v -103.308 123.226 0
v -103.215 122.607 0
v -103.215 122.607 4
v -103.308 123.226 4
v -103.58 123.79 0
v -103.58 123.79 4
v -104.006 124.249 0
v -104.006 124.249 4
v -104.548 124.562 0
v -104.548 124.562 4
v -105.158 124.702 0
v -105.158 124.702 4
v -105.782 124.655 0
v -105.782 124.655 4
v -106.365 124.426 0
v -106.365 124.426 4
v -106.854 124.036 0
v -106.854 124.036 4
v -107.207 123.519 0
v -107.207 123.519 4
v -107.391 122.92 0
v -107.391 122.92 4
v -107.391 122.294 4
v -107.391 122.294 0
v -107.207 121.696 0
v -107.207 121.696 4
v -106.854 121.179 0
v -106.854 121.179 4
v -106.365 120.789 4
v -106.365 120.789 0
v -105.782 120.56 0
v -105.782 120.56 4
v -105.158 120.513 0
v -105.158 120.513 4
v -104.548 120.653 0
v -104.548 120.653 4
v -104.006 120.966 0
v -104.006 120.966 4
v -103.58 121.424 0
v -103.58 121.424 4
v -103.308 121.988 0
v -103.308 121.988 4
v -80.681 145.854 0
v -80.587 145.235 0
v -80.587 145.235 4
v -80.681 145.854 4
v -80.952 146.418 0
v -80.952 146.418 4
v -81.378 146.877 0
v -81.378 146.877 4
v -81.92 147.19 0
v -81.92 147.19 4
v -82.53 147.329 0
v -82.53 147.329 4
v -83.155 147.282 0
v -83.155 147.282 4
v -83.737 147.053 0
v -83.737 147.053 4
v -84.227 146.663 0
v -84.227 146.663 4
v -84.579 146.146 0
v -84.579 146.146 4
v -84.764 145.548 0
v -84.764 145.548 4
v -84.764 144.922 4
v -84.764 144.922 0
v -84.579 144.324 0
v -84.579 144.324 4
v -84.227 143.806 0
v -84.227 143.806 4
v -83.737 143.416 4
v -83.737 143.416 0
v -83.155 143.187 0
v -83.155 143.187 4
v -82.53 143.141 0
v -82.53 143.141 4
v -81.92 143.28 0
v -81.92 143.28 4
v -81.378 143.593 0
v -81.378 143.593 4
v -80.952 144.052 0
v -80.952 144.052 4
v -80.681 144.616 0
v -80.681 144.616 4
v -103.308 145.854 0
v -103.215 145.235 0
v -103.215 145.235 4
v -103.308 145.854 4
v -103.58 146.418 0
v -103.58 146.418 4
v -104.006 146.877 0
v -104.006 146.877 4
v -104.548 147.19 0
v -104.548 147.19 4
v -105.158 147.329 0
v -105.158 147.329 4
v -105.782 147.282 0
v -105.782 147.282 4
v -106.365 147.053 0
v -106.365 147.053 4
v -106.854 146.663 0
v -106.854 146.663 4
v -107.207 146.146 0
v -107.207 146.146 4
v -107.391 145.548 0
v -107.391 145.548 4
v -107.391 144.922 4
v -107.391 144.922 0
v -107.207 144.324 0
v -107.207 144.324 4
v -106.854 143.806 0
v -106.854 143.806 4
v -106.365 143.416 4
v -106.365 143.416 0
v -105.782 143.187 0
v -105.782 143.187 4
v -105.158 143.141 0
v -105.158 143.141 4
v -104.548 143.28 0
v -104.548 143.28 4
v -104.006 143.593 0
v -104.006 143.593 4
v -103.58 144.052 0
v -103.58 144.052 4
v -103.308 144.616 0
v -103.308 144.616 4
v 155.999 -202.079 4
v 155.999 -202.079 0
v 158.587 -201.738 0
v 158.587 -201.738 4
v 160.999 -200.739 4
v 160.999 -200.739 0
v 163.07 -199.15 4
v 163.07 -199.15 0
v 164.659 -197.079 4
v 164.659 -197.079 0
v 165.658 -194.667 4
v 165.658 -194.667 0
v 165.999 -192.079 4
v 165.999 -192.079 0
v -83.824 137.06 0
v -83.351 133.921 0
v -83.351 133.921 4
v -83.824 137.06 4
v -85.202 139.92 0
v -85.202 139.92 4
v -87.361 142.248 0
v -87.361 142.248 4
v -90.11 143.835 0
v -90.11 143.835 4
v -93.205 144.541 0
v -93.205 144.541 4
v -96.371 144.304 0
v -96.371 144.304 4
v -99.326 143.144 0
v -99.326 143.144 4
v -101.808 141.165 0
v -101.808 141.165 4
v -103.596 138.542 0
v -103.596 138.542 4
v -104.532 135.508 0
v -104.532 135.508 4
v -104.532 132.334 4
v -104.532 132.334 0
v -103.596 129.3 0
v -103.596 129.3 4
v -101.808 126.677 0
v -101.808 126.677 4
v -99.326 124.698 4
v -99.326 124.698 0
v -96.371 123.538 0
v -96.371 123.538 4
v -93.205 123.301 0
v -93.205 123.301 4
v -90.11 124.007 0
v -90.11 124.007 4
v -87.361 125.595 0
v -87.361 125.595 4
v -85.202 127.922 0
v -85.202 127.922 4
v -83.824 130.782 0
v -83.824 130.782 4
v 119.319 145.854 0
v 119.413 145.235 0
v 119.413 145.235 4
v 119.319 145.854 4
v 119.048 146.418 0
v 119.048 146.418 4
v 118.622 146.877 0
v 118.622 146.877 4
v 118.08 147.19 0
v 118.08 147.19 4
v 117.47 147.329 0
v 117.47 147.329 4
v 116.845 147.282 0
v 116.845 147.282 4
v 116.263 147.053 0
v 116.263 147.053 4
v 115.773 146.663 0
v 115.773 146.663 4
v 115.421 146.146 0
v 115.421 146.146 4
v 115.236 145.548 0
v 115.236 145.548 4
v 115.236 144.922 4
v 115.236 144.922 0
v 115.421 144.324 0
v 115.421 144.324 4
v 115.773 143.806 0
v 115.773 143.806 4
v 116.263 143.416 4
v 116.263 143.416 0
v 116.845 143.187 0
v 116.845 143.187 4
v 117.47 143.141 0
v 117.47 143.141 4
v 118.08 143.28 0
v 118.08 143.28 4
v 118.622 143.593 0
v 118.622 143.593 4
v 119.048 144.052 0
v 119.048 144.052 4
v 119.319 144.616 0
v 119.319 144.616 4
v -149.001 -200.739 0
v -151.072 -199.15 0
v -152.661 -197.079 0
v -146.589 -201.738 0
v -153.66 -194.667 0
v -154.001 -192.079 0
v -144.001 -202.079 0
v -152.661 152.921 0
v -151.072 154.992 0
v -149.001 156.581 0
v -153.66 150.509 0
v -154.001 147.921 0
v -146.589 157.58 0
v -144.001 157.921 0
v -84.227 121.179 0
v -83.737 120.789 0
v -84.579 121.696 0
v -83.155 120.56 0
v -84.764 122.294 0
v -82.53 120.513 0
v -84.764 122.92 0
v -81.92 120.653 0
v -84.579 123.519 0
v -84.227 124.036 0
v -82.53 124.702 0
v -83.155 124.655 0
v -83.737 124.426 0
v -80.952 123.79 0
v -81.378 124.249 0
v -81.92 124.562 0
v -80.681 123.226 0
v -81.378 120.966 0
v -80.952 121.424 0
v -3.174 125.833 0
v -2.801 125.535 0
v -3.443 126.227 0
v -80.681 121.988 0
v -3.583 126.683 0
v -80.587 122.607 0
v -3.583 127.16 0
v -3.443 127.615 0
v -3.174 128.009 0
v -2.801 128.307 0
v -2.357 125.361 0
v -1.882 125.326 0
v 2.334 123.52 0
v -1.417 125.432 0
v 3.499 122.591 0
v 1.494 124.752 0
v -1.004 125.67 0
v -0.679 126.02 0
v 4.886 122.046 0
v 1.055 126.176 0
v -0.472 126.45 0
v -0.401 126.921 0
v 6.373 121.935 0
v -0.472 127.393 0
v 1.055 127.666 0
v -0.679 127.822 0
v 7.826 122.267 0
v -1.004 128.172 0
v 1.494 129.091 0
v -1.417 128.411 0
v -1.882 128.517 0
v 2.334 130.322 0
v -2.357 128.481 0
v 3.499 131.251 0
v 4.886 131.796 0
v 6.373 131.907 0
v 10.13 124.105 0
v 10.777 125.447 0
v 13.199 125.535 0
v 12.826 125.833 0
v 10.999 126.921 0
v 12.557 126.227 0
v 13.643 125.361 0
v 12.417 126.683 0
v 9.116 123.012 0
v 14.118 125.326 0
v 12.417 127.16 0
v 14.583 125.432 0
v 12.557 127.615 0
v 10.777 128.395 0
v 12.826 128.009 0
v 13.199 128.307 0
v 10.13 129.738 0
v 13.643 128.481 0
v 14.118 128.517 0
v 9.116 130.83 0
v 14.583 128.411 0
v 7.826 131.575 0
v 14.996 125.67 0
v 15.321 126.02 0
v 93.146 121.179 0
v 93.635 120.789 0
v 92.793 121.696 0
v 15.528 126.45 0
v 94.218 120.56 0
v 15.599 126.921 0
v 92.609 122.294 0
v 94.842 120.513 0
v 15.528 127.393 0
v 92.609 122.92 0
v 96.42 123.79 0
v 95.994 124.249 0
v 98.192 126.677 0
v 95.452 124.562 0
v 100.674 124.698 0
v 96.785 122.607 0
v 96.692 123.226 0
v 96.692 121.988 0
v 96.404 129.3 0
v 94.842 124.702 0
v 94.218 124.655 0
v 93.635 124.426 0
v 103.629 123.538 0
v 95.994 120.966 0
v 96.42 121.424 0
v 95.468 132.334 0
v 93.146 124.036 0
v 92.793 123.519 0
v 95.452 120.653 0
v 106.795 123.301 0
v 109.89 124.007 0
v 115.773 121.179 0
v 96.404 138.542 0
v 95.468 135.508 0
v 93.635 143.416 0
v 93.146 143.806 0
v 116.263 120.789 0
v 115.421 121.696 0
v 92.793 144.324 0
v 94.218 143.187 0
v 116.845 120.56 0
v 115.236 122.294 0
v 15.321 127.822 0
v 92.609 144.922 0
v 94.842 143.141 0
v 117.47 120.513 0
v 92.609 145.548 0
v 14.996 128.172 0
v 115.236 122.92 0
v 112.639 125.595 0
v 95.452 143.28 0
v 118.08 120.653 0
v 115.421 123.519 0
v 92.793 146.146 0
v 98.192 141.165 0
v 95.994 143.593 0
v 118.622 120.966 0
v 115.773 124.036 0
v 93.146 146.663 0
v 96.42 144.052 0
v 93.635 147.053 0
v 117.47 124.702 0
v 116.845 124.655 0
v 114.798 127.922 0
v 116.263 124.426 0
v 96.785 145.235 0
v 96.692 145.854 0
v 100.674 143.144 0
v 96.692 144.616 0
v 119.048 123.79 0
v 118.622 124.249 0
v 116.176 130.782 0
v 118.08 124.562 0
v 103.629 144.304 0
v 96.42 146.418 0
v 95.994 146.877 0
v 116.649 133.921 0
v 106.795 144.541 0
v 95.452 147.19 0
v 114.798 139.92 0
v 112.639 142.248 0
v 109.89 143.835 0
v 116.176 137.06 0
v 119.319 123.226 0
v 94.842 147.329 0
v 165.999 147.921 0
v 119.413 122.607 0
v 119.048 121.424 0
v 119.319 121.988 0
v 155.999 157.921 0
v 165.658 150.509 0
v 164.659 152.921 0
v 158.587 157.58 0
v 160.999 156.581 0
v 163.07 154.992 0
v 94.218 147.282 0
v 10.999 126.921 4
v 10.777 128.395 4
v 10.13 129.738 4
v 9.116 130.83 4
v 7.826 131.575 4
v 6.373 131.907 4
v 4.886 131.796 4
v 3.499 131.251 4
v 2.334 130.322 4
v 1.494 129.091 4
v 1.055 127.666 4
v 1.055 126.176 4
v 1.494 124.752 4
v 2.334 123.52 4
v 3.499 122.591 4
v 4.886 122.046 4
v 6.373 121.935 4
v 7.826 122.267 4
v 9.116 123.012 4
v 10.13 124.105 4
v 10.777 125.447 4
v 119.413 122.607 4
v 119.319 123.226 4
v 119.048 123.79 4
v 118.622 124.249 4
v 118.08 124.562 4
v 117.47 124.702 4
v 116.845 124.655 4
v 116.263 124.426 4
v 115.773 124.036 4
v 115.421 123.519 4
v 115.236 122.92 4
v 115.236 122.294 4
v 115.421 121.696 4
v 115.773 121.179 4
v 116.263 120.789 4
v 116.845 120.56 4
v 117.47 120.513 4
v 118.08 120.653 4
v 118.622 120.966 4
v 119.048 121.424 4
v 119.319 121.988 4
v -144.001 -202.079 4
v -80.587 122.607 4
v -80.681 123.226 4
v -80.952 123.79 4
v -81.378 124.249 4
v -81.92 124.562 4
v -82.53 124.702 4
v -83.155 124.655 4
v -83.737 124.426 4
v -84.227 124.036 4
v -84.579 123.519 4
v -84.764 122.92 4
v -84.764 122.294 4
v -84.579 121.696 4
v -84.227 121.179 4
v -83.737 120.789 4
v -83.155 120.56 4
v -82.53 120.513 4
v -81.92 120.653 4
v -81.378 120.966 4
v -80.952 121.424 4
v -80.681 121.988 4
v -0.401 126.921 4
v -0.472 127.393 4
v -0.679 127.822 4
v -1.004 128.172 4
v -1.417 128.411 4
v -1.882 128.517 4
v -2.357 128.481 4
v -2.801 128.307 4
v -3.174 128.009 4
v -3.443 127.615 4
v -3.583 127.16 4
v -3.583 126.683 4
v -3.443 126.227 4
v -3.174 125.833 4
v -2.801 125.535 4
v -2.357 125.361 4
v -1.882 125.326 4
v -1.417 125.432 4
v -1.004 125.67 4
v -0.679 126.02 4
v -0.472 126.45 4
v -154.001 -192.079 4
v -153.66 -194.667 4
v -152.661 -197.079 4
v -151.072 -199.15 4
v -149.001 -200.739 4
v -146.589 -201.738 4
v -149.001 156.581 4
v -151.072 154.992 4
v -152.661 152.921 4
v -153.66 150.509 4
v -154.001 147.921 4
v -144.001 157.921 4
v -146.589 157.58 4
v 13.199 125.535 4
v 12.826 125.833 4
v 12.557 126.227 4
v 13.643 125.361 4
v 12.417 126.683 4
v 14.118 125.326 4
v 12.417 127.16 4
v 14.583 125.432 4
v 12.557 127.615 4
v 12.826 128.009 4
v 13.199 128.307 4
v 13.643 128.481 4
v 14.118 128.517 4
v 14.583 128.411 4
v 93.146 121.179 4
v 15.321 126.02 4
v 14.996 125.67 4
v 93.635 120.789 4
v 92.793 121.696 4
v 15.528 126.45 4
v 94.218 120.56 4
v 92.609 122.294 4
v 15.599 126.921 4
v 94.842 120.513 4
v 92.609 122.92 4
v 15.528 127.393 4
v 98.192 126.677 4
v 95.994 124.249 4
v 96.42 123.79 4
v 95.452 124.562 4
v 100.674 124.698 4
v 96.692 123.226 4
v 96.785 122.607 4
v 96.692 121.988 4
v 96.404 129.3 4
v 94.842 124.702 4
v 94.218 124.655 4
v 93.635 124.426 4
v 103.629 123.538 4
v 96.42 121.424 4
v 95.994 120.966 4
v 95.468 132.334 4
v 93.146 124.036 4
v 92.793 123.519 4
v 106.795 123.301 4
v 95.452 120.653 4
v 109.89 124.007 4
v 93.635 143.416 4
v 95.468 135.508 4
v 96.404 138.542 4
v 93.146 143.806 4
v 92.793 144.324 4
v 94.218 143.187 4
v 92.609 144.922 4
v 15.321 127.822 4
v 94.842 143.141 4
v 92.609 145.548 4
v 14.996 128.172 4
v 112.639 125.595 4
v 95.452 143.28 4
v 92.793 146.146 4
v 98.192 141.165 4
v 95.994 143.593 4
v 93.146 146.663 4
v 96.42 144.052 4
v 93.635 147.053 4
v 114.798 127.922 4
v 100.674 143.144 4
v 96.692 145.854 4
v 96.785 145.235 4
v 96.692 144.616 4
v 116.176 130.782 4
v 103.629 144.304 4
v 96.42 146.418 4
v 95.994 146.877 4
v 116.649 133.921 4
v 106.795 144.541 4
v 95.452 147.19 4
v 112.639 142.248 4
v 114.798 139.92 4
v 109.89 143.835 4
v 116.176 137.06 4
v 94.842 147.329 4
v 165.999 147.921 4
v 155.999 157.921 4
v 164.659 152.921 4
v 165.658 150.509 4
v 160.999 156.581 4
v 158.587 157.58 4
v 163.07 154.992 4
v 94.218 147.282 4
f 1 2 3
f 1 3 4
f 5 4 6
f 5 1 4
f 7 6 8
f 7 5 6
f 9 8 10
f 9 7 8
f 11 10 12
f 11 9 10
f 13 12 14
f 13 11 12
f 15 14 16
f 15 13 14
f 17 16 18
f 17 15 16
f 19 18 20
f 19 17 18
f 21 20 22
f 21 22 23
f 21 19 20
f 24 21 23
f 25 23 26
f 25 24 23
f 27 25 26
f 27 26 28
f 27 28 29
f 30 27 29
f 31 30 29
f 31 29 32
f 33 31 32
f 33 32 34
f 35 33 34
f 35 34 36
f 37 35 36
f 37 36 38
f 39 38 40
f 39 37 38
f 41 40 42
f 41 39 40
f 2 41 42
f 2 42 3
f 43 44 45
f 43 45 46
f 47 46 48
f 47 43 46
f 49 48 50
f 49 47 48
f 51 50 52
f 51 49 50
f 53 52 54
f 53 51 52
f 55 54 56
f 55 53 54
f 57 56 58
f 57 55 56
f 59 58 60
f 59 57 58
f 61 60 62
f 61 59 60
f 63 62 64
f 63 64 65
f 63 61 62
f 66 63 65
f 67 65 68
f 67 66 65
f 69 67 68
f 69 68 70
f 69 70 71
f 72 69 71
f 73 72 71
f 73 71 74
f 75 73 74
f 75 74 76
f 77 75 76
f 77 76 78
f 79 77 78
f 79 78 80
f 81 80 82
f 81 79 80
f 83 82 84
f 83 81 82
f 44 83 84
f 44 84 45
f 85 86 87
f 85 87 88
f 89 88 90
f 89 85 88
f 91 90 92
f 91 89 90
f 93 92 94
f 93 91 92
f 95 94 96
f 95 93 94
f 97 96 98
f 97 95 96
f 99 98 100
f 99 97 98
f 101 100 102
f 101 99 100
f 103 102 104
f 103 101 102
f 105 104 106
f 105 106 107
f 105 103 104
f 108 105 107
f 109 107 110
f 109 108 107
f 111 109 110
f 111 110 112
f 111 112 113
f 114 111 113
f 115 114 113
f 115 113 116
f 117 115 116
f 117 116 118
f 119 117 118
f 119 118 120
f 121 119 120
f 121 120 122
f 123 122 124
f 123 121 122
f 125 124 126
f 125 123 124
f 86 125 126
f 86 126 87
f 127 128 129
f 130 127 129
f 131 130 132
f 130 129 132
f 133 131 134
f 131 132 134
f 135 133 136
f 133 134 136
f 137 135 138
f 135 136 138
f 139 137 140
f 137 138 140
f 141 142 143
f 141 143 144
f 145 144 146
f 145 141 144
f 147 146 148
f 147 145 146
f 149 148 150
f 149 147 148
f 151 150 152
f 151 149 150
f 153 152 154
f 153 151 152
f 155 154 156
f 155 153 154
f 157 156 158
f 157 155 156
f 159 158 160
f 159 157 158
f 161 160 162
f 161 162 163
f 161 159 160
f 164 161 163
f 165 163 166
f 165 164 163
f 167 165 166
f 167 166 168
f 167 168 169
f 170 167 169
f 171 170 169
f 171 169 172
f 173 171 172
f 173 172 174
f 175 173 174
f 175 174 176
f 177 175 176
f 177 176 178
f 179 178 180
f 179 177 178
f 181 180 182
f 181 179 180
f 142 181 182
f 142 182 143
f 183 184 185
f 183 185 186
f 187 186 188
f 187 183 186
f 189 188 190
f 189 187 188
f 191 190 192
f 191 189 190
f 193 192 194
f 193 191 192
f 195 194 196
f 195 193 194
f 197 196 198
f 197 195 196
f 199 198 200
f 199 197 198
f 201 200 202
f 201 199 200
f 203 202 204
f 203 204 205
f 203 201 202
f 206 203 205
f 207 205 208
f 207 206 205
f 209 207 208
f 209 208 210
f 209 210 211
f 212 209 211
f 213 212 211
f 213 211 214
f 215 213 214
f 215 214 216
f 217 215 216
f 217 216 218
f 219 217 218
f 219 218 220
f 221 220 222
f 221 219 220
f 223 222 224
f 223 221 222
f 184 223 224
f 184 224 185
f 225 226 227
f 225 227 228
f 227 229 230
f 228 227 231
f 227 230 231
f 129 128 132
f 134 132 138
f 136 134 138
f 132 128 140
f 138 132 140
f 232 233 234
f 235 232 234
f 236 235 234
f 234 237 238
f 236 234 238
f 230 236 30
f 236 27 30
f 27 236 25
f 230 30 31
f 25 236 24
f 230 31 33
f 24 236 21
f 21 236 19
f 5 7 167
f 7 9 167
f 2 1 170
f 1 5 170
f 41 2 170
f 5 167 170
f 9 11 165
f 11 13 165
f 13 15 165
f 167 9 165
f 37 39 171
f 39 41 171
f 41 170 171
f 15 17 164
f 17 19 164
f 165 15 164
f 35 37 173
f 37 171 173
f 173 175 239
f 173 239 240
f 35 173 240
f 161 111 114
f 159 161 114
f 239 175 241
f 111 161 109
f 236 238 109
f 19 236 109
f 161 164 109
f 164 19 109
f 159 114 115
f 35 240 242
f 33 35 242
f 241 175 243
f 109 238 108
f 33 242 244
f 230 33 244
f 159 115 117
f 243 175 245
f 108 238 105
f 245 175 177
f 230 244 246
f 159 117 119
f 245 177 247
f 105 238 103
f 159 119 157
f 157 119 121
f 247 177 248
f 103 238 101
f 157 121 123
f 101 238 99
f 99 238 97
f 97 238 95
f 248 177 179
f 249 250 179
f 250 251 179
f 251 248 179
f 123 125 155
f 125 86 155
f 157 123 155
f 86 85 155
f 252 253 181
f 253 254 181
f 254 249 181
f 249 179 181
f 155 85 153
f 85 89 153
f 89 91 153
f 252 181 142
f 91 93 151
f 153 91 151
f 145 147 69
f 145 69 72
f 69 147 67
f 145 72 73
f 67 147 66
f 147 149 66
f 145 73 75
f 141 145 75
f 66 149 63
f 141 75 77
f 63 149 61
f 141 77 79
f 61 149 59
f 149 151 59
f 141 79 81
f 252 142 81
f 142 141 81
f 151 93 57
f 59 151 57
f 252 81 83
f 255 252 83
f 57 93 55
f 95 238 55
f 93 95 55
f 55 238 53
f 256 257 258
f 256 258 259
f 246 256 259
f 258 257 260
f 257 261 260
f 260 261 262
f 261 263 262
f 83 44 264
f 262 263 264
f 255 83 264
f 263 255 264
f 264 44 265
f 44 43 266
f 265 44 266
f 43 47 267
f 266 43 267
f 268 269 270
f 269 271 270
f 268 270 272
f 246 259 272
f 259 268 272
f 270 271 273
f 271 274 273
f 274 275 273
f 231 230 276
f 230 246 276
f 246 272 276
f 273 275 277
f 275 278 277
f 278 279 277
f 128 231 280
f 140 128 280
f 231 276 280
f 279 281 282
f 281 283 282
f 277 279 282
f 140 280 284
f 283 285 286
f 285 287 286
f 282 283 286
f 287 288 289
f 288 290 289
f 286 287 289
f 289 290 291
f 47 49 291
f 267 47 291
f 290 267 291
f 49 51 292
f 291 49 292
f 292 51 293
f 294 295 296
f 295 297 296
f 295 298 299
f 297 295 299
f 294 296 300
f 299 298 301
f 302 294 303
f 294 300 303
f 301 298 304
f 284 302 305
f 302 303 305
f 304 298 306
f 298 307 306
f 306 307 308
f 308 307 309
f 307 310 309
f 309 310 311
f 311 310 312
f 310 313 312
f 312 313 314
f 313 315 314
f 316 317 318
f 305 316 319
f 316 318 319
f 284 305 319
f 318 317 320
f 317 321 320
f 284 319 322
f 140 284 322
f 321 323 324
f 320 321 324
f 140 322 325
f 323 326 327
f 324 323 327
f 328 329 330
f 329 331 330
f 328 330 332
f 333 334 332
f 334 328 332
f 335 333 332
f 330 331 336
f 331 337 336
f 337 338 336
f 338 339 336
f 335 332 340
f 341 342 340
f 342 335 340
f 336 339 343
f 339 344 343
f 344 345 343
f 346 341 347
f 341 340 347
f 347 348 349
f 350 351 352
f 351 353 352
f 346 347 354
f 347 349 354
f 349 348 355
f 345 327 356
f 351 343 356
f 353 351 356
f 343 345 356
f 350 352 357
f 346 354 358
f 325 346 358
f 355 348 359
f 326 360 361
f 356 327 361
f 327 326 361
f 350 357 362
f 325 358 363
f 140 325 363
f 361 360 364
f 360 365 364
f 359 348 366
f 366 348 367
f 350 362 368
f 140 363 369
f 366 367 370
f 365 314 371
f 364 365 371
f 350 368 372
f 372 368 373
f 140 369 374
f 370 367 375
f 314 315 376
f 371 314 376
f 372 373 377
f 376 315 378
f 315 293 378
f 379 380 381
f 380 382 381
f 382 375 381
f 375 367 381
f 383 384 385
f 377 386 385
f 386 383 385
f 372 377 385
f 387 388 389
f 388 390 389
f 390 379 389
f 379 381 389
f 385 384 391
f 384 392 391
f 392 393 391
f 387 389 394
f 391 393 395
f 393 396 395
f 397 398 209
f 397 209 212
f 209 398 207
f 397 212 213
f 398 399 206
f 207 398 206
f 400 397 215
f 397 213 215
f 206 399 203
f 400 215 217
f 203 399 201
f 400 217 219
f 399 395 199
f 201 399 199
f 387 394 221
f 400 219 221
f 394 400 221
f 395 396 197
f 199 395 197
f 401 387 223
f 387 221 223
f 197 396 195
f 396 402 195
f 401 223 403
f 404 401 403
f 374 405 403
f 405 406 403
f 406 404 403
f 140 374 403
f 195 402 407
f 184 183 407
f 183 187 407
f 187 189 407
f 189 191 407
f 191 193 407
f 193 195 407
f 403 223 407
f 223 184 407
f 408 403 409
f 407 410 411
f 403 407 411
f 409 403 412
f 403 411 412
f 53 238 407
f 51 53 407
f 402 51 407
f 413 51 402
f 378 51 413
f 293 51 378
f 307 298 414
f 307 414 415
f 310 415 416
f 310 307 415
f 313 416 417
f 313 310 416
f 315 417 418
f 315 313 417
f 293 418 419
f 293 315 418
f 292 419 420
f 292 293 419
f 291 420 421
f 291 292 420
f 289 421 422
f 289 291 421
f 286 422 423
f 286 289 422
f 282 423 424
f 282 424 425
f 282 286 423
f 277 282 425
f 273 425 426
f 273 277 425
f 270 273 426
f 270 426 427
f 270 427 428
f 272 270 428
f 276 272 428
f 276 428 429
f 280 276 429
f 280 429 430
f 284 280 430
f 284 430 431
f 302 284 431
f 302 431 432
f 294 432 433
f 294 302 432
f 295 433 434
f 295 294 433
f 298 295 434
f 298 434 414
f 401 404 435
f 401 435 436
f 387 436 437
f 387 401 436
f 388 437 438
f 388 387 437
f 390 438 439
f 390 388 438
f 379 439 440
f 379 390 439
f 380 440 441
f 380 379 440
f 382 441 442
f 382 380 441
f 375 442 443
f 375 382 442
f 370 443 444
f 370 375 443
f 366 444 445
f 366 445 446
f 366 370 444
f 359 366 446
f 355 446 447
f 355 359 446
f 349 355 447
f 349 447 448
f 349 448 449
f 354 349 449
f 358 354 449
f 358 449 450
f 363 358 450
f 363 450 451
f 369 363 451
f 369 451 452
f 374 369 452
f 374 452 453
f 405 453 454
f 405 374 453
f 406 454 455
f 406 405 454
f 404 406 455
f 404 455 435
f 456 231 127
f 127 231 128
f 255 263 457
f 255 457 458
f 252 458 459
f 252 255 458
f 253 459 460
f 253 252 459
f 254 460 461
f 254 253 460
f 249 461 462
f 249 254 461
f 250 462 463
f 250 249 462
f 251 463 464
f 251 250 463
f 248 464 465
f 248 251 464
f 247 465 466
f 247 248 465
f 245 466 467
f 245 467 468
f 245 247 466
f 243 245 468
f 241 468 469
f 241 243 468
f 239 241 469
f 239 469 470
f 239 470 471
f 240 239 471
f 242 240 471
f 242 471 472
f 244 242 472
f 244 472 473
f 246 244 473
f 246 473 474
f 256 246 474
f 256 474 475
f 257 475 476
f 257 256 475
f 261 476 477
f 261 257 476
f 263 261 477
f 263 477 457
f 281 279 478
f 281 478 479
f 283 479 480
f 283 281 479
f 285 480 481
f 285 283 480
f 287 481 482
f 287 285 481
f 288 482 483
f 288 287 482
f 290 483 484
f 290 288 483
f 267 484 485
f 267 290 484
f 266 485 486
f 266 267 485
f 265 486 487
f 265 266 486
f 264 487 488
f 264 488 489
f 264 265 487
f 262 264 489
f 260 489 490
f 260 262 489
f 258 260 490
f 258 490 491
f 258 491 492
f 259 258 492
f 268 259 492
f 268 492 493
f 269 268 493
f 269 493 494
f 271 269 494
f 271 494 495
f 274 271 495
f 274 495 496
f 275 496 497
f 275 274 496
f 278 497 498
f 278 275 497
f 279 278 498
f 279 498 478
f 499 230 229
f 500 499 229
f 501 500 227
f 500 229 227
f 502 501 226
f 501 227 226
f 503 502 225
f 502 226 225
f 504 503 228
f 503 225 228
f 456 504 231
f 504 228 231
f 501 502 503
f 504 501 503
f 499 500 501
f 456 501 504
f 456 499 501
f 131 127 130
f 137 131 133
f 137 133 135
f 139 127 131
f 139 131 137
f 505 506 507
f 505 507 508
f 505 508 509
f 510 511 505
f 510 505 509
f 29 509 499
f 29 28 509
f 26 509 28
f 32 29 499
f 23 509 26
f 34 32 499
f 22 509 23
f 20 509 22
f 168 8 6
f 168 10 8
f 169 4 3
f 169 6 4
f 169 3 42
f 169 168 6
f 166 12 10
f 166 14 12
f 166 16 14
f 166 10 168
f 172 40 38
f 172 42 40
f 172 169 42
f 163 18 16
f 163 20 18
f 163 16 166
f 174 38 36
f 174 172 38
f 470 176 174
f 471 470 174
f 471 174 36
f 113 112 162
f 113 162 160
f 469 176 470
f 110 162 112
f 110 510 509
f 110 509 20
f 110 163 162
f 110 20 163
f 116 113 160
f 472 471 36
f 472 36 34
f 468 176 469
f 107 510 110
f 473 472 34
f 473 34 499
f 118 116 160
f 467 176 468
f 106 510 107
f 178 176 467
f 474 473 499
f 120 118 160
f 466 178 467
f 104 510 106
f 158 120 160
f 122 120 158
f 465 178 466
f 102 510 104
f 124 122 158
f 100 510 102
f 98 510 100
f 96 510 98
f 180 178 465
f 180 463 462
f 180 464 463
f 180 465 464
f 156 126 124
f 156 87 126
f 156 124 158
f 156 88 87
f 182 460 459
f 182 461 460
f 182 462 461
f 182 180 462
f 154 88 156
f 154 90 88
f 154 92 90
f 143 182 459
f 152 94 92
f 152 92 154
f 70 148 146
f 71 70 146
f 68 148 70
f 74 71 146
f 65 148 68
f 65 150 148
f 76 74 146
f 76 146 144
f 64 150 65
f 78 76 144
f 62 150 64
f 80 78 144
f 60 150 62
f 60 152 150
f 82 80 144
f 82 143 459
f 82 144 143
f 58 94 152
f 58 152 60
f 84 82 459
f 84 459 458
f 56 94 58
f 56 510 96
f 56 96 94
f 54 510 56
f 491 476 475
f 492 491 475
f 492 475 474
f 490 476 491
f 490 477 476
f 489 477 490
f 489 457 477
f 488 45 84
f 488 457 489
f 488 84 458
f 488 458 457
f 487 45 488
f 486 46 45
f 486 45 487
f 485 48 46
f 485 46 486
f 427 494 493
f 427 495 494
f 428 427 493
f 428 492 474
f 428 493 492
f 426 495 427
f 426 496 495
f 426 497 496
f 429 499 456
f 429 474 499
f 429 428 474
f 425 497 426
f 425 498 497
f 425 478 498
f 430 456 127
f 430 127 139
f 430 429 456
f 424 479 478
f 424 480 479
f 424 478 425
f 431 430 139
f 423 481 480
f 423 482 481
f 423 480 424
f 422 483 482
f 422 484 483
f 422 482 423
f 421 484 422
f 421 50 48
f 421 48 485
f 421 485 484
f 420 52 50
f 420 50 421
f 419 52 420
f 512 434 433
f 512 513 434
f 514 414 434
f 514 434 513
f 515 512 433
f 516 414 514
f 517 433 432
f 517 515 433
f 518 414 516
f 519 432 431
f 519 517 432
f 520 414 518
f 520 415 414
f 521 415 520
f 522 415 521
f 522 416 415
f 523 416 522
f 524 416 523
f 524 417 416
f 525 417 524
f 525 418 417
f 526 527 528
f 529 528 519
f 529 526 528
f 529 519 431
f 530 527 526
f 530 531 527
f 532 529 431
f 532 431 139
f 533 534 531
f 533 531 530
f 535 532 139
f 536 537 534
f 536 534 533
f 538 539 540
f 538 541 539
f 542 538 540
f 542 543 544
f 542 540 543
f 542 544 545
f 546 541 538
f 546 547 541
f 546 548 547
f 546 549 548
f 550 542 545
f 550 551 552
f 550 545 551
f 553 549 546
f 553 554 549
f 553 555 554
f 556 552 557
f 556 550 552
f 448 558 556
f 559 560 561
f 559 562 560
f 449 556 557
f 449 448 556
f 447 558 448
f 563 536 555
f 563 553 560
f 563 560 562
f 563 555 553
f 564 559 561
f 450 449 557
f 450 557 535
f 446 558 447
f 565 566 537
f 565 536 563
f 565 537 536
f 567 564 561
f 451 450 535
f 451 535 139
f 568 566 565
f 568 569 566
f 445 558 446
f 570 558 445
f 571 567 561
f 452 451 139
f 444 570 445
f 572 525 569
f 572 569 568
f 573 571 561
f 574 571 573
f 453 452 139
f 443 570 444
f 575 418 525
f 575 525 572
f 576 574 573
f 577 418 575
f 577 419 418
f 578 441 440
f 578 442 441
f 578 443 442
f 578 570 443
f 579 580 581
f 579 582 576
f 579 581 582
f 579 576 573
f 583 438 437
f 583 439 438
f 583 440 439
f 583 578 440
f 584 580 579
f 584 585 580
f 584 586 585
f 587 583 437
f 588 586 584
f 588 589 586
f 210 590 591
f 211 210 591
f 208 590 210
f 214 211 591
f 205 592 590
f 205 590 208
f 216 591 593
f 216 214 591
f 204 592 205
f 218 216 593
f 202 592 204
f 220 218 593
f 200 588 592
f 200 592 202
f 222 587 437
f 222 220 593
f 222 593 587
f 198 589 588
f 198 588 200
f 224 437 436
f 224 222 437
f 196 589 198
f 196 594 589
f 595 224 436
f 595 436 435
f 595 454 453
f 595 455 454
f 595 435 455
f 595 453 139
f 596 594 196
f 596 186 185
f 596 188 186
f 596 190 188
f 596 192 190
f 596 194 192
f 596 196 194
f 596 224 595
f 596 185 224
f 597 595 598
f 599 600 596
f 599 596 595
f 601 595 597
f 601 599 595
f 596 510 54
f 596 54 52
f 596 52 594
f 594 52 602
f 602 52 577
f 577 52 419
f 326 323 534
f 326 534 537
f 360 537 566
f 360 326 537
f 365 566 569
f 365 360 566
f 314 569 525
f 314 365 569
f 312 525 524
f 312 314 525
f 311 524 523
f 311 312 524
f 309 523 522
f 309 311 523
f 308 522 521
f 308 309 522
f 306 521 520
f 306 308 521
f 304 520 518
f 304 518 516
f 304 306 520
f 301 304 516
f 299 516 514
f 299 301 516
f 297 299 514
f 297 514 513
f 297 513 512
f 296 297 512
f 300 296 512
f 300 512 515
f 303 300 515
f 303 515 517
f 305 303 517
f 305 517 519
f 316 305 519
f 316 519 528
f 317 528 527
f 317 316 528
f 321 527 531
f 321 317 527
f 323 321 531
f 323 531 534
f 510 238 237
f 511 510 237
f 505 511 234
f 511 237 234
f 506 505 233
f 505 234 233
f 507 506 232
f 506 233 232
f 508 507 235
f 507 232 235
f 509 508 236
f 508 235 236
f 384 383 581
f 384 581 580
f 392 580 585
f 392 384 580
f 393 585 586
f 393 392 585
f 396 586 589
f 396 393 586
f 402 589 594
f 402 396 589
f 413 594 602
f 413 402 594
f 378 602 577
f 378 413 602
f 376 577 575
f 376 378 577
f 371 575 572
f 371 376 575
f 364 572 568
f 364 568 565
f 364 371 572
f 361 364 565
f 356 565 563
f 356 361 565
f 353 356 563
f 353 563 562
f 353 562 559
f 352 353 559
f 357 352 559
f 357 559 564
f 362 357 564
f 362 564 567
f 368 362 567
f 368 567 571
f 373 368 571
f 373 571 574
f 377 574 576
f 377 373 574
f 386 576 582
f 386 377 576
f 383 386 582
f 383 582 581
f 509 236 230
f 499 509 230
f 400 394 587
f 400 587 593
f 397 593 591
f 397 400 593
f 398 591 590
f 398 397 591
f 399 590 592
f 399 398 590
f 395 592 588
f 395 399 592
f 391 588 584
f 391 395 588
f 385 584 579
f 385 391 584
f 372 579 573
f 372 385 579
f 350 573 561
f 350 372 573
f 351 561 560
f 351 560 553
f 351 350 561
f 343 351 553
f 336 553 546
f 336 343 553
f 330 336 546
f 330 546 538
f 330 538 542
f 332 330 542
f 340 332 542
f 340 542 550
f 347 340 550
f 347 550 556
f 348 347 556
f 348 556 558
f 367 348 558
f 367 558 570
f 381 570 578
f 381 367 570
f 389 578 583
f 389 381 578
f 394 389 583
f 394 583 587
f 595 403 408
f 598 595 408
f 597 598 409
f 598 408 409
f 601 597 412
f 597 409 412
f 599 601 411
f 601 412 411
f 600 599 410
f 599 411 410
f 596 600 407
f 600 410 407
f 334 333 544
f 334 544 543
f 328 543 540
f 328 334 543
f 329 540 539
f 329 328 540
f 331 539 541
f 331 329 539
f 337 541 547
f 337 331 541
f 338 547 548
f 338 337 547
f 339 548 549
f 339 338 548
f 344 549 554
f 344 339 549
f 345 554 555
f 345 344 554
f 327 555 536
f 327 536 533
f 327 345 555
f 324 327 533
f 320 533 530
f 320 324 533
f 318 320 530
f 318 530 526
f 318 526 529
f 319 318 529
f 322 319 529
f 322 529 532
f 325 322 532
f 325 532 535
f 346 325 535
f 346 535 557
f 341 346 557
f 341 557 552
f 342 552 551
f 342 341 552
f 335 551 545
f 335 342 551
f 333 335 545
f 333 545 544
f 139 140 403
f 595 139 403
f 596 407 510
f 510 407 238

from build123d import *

# Parameters (mm, degrees)
F0_R     = 2.1
F0_R_2   = 10.65
F0_R_3   = 1.6
F0_R_4   = 5
F1_DEPTH = 4


with BuildPart() as f1:
    # F0 (on Top) → F1 (new body)
    with BuildSketch(Plane.XY):
        with BuildLine():
            Line((155.998865, 157.921114), (-144.001135, 157.921114))
            ThreePointArc((-144.001135, 157.921114), (-151.072203, 154.992182), (-154.001135, 147.921114))
            Line((-154.001135, 147.921114), (-154.001135, -192.078886))
            ThreePointArc((-154.001135, -192.078886), (-151.072203, -199.149954), (-144.001135, -202.078886))
            Line((-144.001135, -202.078886), (155.998865, -202.078886))
            ThreePointArc((155.998865, -202.078886), (163.069933, -199.149954), (165.998865, -192.078886))
            Line((165.998865, -192.078886), (165.998865, 147.921114))
            ThreePointArc((165.998865, 147.921114), (163.069933, 154.992182), (155.998865, 157.921114))
        make_face()
        with Locations((-105.314844, 122.607405)):
            Circle(F0_R, mode=Mode.SUBTRACT)
        with Locations((-94.001135, 133.921114)):
            Circle(F0_R_2, mode=Mode.SUBTRACT)
        with Locations((-82.687427, 122.607405)):
            Circle(F0_R, mode=Mode.SUBTRACT)
        with Locations((-105.314844, 145.234822)):
            Circle(F0_R, mode=Mode.SUBTRACT)
        with Locations((-82.687427, 145.234822)):
            Circle(F0_R, mode=Mode.SUBTRACT)
        with Locations((-2.001135, 126.921114)):
            Circle(F0_R_3, mode=Mode.SUBTRACT)
        with Locations((5.998865, 126.921114)):
            Circle(F0_R_4, mode=Mode.SUBTRACT)
        with Locations((13.998865, 126.921114)):
            Circle(F0_R_3, mode=Mode.SUBTRACT)
        with Locations((94.685156, 122.607405)):
            Circle(F0_R, mode=Mode.SUBTRACT)
        with Locations((117.312573, 122.607405)):
            Circle(F0_R, mode=Mode.SUBTRACT)
        with Locations((105.998865, 133.921114)):
            Circle(F0_R_2, mode=Mode.SUBTRACT)
        with Locations((94.685156, 145.234822)):
            Circle(F0_R, mode=Mode.SUBTRACT)
        with Locations((117.312573, 145.234822)):
            Circle(F0_R, mode=Mode.SUBTRACT)
    extrude(amount=F1_DEPTH)


solid = f1.part
